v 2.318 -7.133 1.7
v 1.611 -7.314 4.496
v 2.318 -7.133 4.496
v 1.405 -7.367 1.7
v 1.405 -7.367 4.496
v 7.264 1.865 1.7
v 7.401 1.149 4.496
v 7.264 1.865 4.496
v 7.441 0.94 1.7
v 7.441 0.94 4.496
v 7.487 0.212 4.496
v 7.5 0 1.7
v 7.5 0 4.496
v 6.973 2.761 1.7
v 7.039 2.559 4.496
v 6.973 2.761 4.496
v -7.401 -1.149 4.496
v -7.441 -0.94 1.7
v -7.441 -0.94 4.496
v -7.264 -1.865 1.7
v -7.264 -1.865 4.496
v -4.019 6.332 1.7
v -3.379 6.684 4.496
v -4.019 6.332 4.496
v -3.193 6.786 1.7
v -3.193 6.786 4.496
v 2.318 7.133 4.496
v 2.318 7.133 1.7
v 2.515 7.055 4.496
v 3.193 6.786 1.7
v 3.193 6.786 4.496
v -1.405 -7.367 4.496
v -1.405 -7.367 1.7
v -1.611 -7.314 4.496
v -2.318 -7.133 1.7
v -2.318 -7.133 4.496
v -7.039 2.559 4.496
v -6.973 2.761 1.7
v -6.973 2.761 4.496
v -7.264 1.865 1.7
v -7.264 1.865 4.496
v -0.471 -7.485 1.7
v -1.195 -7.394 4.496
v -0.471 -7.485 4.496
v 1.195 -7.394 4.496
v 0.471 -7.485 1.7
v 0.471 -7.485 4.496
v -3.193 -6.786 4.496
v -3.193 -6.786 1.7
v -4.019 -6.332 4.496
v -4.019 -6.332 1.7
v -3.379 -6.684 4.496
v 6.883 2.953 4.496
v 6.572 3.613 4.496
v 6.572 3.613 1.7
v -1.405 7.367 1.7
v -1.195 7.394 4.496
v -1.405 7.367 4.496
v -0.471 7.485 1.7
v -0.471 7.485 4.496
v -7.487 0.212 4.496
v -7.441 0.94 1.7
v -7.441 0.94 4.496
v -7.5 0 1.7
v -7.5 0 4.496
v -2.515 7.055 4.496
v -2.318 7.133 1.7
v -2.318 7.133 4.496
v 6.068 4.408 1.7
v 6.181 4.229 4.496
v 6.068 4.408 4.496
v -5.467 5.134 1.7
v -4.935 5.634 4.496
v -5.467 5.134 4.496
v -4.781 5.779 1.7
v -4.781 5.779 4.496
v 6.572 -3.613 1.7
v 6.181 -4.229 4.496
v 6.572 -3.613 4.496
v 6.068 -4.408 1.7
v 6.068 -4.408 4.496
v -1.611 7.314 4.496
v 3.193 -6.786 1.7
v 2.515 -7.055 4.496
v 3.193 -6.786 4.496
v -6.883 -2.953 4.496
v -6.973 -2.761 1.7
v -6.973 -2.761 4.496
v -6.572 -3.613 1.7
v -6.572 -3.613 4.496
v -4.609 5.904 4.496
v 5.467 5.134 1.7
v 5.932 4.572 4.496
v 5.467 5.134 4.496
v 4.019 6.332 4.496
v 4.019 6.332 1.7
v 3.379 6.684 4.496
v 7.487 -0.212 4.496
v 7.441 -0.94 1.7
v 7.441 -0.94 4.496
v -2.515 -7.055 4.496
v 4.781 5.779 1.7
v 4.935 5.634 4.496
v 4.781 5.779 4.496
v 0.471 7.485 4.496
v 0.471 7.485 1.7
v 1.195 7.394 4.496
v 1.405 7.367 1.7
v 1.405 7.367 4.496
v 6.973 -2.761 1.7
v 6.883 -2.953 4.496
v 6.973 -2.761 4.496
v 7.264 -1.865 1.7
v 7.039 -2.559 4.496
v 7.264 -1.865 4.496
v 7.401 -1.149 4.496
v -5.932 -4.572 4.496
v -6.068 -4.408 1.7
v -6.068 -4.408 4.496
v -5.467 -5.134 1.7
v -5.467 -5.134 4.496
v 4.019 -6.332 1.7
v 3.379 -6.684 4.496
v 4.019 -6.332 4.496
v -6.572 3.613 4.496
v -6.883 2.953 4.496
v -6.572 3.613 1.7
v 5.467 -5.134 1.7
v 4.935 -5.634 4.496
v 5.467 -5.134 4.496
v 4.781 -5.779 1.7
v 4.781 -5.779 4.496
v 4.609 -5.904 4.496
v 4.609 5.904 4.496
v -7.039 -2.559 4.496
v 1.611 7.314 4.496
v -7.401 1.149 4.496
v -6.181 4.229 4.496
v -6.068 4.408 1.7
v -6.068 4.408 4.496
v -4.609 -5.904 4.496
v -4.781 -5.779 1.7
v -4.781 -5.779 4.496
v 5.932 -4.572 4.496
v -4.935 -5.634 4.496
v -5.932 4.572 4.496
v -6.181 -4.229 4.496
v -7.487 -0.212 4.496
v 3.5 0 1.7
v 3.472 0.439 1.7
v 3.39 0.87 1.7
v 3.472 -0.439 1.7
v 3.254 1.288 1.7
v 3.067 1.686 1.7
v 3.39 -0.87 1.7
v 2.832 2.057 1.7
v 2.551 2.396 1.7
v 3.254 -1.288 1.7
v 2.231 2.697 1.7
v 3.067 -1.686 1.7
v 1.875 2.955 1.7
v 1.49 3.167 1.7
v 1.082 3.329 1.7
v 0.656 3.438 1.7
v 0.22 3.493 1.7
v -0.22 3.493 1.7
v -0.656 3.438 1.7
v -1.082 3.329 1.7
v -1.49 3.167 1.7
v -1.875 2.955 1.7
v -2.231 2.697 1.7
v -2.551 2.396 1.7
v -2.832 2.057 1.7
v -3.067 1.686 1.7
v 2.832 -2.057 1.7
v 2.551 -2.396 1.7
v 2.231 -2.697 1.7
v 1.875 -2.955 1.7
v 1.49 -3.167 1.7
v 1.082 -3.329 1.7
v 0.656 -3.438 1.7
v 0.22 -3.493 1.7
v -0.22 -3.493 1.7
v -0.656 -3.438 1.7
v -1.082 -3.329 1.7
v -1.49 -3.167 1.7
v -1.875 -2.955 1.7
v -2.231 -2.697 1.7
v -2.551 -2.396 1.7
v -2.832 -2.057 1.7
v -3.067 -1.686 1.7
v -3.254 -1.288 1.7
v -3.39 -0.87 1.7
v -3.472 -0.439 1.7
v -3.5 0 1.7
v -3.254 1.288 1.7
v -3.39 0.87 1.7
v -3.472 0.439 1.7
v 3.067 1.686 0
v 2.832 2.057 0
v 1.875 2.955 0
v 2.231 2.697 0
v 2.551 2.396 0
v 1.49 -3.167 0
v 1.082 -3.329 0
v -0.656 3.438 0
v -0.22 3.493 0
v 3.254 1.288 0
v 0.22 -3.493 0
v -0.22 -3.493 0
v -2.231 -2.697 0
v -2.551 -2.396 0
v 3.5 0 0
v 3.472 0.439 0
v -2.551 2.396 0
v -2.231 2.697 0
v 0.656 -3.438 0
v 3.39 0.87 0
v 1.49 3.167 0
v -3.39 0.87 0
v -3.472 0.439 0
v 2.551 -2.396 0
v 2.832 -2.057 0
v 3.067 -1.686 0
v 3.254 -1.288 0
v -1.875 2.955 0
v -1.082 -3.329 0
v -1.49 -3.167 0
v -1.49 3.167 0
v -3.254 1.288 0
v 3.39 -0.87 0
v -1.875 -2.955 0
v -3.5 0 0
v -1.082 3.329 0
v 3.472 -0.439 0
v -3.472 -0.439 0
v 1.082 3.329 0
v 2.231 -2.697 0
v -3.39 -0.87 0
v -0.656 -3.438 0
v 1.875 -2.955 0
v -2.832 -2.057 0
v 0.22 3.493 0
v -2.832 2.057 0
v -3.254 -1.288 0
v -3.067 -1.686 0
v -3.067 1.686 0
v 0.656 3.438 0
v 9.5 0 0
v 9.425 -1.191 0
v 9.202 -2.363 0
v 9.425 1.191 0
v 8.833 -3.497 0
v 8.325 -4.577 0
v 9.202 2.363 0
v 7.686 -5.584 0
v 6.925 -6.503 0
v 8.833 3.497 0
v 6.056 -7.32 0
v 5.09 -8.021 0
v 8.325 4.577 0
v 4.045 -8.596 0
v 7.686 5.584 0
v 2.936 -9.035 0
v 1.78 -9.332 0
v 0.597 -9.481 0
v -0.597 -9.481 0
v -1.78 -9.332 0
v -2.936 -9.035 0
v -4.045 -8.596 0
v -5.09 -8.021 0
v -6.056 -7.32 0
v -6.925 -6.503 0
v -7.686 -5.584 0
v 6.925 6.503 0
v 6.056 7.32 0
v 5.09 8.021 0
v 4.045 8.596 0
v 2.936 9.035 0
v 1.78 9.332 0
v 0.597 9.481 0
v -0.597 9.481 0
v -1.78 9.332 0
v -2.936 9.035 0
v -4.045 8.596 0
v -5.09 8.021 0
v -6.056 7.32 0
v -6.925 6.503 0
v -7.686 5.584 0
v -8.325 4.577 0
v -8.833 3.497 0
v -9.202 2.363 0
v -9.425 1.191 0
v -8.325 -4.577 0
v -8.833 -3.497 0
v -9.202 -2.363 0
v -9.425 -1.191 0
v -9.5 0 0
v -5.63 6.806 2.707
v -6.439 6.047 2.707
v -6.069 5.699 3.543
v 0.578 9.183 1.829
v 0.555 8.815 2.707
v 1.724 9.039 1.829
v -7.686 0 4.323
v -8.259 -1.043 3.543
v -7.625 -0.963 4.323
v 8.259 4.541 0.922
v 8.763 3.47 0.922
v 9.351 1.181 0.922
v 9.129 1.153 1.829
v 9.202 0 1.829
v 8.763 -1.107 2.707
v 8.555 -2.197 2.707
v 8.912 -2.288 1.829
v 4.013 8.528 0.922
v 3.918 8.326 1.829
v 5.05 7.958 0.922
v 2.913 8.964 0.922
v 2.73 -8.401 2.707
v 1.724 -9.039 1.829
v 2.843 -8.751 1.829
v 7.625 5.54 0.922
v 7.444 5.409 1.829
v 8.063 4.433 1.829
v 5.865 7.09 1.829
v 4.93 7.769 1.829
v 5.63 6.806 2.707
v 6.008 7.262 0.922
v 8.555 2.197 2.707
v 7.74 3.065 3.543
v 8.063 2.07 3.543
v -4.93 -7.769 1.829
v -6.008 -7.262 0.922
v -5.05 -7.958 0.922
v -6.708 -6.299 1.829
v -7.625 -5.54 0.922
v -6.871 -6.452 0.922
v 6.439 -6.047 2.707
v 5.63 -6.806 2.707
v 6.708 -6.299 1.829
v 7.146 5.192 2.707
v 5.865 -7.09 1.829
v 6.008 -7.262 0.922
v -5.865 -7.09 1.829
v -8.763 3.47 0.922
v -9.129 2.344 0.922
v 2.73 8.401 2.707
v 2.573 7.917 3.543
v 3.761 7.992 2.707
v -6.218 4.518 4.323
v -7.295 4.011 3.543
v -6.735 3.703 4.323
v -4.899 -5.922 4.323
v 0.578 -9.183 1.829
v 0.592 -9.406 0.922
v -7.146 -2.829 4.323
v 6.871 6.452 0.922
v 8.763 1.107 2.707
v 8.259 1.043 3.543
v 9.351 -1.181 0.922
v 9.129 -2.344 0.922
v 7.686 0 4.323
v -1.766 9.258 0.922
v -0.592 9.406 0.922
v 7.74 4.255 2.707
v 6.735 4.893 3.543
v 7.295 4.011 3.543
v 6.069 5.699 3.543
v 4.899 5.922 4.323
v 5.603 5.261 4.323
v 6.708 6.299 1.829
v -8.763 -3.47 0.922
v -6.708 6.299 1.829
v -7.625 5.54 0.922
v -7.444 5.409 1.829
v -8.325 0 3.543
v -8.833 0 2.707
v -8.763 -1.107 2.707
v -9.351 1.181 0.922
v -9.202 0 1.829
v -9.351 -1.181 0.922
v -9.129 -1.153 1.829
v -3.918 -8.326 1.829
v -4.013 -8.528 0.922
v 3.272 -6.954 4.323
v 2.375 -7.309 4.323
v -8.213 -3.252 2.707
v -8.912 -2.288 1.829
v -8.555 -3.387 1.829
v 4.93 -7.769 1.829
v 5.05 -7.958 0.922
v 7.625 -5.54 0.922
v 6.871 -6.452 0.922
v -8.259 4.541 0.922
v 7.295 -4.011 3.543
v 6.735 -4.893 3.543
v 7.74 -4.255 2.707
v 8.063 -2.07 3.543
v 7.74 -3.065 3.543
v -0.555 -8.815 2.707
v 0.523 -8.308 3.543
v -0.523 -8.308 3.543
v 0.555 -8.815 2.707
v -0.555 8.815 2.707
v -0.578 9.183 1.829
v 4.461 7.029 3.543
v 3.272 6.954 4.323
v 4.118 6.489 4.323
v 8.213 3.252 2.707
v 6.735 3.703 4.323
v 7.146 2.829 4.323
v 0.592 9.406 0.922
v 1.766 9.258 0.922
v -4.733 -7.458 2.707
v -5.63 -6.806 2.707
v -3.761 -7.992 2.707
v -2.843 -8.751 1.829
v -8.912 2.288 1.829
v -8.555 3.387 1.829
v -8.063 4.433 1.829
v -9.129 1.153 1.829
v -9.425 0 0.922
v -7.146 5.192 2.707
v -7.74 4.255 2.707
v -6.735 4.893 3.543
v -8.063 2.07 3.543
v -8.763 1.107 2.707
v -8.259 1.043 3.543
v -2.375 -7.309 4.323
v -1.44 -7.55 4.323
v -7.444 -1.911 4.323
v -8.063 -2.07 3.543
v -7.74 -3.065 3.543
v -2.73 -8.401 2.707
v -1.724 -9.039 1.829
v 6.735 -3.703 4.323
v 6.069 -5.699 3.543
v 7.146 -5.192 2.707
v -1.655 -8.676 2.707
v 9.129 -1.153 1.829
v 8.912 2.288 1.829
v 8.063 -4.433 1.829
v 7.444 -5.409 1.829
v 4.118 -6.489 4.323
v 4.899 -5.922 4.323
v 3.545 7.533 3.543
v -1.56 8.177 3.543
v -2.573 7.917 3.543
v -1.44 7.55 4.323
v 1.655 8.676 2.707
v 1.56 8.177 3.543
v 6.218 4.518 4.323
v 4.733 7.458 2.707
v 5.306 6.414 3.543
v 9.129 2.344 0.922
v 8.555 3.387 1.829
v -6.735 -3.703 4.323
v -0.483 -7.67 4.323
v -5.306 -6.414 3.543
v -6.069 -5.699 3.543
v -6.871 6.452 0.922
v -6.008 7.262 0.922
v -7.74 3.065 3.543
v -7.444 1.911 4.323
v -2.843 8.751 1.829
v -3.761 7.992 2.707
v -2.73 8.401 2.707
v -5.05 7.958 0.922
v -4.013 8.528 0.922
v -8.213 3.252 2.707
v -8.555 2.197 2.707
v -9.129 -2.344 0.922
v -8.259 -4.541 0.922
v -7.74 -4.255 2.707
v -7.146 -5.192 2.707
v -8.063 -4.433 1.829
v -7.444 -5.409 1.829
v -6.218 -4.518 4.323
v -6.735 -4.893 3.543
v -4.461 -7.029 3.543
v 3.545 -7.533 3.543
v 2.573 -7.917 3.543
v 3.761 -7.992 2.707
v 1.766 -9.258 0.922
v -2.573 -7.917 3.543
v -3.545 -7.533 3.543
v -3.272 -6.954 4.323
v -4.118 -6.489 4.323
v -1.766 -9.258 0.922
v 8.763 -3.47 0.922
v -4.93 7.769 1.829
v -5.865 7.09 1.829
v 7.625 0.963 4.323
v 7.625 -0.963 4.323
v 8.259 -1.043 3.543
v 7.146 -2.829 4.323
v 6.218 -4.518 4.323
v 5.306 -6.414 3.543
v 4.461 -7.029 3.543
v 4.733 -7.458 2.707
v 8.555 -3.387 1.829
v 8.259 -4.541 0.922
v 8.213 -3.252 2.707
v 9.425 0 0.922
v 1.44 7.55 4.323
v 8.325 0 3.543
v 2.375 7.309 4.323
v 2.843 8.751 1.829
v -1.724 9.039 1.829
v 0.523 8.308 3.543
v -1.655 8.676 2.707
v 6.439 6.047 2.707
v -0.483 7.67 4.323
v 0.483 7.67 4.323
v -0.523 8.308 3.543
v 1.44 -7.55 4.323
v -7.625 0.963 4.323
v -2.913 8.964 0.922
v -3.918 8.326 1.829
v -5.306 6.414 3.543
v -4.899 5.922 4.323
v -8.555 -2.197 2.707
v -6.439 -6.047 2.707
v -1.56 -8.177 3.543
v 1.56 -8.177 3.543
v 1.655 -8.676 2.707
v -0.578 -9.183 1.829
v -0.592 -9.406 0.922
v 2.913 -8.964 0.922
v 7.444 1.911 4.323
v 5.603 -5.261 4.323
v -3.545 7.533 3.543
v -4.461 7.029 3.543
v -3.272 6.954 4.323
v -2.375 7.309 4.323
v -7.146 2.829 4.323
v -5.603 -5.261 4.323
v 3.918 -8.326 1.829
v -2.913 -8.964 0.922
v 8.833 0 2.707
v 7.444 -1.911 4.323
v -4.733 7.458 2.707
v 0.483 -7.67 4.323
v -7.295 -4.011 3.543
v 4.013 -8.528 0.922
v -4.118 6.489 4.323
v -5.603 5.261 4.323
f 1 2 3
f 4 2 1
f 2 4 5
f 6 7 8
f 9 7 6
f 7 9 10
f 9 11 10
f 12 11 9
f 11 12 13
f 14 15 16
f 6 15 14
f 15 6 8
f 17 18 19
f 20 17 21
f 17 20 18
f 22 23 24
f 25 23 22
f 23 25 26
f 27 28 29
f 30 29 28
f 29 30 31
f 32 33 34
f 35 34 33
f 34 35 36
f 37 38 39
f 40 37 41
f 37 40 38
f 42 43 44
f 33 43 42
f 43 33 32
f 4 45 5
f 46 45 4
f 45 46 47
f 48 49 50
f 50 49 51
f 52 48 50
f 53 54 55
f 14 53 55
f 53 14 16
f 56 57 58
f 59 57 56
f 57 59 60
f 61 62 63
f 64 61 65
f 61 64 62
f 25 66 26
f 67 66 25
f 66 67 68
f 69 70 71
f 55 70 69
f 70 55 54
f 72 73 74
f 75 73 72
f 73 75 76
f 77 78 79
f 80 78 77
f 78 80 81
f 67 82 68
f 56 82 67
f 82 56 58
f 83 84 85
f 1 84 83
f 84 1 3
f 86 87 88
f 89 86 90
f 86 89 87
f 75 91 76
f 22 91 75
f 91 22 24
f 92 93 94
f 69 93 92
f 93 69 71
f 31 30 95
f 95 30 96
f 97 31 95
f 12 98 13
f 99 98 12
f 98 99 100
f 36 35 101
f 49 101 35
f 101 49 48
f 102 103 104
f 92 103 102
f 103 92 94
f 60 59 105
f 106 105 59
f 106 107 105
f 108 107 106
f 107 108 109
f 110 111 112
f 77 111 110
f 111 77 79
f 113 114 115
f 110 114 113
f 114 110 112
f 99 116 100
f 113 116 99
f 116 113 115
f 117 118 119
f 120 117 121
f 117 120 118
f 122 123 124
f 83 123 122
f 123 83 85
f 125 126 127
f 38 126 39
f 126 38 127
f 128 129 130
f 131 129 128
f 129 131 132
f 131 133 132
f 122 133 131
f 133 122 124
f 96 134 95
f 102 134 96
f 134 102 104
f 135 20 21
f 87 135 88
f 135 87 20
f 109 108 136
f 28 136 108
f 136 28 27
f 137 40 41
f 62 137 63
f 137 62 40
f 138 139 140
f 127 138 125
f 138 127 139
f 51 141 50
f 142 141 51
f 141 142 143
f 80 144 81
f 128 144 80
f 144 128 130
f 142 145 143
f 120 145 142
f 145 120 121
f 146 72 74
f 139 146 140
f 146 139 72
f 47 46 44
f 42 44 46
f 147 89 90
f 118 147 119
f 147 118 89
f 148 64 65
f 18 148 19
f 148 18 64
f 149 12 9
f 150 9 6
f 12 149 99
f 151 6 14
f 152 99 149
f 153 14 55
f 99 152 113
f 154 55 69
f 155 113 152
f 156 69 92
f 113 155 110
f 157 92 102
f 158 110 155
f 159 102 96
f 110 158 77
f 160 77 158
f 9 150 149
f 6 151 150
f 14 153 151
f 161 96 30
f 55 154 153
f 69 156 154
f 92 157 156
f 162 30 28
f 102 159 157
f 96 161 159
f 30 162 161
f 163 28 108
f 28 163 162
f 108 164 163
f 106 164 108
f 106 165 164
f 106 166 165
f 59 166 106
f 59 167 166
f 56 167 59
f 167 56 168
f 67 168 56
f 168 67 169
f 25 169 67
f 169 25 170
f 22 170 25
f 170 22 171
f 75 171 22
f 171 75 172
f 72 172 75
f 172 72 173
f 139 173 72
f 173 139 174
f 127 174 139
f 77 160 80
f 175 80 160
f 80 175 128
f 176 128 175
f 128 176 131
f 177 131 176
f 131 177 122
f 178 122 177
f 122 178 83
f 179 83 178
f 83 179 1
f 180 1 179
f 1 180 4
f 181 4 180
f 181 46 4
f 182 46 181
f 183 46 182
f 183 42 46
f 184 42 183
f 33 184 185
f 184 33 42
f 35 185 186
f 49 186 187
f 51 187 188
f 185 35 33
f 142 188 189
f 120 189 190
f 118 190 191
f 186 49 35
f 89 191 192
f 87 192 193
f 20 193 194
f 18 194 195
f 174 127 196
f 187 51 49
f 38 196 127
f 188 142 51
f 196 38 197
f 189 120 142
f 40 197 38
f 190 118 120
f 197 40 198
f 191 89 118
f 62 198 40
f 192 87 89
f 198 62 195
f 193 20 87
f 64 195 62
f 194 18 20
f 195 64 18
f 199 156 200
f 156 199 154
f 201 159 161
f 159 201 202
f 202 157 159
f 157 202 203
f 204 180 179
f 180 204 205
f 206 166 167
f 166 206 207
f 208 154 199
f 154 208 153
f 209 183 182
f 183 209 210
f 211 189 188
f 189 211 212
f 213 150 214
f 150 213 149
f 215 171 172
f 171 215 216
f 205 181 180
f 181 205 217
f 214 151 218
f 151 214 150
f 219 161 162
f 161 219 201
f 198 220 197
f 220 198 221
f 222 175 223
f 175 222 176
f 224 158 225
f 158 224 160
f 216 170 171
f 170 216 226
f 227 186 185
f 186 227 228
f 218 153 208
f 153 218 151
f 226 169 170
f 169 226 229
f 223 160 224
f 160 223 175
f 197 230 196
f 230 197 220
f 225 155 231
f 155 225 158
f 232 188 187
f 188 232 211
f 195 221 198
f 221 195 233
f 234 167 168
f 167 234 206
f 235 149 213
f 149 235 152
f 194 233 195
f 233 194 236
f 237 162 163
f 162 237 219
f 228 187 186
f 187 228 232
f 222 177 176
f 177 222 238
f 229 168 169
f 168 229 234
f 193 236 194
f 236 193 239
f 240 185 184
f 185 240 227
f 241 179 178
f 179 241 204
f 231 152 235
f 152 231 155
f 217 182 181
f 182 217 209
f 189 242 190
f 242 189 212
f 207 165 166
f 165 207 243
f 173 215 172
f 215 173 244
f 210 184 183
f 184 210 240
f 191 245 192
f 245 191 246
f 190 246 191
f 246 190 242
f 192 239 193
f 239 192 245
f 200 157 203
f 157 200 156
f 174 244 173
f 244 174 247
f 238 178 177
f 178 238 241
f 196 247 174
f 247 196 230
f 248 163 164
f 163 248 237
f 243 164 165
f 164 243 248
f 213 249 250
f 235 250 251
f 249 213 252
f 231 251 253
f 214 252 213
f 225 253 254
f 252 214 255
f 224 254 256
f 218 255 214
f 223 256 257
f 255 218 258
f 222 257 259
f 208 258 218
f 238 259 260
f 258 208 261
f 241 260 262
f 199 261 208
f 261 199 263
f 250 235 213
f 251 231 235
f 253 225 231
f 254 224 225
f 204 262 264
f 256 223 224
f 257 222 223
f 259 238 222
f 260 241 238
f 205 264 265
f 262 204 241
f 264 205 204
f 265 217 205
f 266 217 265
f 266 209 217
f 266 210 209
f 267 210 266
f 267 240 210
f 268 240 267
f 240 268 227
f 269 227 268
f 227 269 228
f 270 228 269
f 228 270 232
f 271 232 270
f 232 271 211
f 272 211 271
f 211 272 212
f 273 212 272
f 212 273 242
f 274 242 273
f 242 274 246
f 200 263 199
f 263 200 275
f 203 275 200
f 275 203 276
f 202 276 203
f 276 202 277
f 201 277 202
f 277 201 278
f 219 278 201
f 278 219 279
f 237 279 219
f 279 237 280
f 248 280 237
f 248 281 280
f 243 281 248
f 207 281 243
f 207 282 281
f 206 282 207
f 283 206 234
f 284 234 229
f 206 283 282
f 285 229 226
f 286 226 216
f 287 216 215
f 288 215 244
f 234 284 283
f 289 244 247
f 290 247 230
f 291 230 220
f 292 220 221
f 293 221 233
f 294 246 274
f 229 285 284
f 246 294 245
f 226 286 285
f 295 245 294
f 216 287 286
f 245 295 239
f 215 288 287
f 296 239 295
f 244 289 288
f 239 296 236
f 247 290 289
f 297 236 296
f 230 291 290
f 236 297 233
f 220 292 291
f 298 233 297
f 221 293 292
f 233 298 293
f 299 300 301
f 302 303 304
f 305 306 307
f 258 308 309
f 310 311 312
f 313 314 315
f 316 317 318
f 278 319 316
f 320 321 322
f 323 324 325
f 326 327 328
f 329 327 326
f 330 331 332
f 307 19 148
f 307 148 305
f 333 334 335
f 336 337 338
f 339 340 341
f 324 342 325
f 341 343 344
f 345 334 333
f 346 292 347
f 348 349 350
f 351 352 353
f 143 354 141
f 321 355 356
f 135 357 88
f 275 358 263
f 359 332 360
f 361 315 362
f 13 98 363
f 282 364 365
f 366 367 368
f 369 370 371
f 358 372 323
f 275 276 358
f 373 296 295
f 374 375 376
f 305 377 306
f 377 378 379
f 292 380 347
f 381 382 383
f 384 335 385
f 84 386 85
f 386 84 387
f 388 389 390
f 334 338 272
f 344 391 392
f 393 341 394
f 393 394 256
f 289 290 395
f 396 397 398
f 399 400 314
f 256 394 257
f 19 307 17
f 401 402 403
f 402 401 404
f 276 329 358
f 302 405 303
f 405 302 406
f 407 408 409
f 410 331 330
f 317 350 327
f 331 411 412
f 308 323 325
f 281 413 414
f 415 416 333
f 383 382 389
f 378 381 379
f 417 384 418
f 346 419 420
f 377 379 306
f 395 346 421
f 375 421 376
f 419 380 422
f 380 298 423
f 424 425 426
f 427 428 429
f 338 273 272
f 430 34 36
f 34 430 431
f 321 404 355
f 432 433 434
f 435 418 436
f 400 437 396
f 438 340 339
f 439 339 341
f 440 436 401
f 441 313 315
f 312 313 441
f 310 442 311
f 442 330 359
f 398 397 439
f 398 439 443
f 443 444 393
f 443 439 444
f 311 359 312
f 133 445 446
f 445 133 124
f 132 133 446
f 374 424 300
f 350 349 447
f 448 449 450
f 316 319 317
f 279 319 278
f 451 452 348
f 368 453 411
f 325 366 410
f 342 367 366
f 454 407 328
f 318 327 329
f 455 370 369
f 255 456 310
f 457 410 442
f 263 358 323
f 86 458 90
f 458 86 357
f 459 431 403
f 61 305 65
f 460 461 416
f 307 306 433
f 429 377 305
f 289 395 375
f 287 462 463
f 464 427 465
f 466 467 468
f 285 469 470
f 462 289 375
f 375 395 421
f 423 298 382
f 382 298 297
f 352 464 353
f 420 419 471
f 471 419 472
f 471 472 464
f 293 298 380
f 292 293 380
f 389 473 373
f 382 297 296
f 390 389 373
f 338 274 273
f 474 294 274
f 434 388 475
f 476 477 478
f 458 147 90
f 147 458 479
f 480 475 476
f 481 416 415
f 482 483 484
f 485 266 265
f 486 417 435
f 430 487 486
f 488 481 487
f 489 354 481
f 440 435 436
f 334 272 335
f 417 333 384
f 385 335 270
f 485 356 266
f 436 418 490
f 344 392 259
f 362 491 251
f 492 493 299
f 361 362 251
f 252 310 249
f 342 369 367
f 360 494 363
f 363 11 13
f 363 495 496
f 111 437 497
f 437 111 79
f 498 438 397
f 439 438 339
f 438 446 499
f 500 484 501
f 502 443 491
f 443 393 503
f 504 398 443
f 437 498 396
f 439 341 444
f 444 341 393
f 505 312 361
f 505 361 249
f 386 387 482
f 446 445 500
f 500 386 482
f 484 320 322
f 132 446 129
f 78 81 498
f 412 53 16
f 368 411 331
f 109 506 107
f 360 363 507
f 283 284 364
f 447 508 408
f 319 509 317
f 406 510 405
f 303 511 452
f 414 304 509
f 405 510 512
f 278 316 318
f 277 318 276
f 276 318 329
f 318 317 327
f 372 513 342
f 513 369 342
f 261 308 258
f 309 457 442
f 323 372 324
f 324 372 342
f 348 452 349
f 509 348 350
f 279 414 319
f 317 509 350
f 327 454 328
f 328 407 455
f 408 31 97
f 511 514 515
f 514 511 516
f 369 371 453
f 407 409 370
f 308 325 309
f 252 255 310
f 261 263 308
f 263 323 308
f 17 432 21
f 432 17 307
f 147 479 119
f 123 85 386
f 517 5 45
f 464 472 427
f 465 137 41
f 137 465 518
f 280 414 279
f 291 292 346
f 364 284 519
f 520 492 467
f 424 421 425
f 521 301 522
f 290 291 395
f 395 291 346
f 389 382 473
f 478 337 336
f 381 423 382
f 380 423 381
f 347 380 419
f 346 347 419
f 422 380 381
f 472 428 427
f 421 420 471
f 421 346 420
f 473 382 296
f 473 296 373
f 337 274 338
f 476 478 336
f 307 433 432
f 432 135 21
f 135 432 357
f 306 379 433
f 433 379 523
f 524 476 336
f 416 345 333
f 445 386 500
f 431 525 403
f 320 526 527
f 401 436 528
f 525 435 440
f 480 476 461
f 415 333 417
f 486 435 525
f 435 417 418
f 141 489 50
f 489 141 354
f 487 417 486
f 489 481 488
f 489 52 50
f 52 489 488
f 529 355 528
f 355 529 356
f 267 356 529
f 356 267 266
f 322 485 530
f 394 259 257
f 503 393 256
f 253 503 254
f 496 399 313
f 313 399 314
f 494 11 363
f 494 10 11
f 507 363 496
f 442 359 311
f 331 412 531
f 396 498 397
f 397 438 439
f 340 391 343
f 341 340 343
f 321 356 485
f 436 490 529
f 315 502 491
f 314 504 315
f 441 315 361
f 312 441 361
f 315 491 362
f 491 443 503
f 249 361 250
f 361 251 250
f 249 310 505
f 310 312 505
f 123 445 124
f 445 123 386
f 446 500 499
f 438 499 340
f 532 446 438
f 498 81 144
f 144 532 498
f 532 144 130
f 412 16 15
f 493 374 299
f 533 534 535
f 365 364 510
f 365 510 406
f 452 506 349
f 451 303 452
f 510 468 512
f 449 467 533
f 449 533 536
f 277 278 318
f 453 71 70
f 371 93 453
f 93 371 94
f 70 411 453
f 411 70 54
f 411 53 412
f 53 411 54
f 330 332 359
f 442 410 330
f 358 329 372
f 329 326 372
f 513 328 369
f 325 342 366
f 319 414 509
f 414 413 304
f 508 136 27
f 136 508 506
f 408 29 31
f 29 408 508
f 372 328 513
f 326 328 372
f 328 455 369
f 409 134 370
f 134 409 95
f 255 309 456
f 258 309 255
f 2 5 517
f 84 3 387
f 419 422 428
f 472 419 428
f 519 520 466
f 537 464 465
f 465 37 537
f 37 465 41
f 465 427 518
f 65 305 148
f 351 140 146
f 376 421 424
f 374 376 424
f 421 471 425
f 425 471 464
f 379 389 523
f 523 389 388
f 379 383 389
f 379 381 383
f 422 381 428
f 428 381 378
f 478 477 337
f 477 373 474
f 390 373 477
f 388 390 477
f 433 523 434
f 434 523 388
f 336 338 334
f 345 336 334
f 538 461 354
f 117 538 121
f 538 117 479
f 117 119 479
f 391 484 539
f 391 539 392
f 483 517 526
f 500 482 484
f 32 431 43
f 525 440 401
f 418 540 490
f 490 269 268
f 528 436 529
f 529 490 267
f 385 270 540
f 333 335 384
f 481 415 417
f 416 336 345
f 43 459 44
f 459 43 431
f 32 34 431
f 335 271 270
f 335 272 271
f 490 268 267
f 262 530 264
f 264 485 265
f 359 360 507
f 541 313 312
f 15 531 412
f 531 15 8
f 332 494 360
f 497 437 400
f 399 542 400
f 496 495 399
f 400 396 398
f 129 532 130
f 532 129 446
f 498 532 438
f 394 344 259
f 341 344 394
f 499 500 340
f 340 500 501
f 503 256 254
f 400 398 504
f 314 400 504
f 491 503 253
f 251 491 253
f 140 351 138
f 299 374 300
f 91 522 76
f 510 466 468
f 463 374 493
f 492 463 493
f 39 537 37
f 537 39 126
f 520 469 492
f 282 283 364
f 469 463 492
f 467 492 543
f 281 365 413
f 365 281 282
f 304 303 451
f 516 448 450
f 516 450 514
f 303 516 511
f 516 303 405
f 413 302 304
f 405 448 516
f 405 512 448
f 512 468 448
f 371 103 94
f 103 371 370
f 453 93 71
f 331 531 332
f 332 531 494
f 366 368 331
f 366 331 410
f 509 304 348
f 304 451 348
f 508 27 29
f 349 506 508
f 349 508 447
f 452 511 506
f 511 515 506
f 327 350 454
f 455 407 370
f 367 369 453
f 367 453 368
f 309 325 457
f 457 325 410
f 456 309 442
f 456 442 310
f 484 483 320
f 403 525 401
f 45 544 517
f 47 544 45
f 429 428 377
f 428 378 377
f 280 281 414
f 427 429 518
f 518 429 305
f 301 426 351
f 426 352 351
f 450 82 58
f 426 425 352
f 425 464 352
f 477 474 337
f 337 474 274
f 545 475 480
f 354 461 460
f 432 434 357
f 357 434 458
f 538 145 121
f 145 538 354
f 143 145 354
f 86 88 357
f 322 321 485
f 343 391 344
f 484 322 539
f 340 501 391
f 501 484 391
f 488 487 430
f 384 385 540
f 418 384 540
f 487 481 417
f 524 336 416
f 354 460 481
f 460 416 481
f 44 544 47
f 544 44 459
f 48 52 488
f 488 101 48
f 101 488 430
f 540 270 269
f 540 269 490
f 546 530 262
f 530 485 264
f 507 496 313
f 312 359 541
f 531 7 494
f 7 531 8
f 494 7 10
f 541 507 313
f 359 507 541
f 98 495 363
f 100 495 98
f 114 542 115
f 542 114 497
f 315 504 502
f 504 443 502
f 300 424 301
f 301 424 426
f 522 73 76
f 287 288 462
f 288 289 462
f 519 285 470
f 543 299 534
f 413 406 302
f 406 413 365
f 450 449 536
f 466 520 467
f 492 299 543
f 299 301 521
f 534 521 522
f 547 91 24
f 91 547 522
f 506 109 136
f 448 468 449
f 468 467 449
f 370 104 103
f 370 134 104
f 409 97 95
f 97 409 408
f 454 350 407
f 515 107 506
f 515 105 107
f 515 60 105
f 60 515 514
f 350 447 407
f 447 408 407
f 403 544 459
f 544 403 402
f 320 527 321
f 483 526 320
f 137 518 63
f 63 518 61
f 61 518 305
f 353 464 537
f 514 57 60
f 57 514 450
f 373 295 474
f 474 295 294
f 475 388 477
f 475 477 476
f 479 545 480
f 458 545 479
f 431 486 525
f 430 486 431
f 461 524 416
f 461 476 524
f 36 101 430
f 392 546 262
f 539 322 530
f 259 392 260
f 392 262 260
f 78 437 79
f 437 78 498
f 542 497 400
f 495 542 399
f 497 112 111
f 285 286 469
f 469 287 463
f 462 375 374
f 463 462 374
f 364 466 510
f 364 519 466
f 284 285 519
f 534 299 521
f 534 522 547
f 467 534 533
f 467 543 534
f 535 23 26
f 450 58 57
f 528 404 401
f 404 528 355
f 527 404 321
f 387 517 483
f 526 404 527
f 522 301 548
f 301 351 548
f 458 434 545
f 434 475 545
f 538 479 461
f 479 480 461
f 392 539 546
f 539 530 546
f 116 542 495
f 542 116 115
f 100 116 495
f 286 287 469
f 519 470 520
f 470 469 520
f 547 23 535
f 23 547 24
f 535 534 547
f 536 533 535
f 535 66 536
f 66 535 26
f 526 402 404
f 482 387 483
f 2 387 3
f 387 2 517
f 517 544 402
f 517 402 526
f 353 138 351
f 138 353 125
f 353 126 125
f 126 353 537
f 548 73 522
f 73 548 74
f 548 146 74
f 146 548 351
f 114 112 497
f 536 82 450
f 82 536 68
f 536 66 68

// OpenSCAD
HEIGHT = 5.2;
GASKET_HEIGHT = HEIGHT-3.5;

DIAMETER = 19;
GASKET_OUTER_DIAMETER = 15;
GASKET_INNER_DIAMETER = 7;

$fn = 50;

intersection() {
    difference() {
        cylinder(h = HEIGHT, r1 = DIAMETER/2, r2 = DIAMETER/2);

        union() {
            translate([0, 0, GASKET_HEIGHT])
                cylinder(h = HEIGHT, 
                         r1 = GASKET_OUTER_DIAMETER/2, 
                         r2 = GASKET_OUTER_DIAMETER/2
            );

            cylinder(h = HEIGHT*2, 
                     r1 = GASKET_INNER_DIAMETER/2, 
                     r2 = GASKET_INNER_DIAMETER/2,
                     center = true
            );
        }
    }
    scale([1, 1, sqrt(2)*2*HEIGHT/DIAMETER])
        sphere(r = DIAMETER/2);
}
